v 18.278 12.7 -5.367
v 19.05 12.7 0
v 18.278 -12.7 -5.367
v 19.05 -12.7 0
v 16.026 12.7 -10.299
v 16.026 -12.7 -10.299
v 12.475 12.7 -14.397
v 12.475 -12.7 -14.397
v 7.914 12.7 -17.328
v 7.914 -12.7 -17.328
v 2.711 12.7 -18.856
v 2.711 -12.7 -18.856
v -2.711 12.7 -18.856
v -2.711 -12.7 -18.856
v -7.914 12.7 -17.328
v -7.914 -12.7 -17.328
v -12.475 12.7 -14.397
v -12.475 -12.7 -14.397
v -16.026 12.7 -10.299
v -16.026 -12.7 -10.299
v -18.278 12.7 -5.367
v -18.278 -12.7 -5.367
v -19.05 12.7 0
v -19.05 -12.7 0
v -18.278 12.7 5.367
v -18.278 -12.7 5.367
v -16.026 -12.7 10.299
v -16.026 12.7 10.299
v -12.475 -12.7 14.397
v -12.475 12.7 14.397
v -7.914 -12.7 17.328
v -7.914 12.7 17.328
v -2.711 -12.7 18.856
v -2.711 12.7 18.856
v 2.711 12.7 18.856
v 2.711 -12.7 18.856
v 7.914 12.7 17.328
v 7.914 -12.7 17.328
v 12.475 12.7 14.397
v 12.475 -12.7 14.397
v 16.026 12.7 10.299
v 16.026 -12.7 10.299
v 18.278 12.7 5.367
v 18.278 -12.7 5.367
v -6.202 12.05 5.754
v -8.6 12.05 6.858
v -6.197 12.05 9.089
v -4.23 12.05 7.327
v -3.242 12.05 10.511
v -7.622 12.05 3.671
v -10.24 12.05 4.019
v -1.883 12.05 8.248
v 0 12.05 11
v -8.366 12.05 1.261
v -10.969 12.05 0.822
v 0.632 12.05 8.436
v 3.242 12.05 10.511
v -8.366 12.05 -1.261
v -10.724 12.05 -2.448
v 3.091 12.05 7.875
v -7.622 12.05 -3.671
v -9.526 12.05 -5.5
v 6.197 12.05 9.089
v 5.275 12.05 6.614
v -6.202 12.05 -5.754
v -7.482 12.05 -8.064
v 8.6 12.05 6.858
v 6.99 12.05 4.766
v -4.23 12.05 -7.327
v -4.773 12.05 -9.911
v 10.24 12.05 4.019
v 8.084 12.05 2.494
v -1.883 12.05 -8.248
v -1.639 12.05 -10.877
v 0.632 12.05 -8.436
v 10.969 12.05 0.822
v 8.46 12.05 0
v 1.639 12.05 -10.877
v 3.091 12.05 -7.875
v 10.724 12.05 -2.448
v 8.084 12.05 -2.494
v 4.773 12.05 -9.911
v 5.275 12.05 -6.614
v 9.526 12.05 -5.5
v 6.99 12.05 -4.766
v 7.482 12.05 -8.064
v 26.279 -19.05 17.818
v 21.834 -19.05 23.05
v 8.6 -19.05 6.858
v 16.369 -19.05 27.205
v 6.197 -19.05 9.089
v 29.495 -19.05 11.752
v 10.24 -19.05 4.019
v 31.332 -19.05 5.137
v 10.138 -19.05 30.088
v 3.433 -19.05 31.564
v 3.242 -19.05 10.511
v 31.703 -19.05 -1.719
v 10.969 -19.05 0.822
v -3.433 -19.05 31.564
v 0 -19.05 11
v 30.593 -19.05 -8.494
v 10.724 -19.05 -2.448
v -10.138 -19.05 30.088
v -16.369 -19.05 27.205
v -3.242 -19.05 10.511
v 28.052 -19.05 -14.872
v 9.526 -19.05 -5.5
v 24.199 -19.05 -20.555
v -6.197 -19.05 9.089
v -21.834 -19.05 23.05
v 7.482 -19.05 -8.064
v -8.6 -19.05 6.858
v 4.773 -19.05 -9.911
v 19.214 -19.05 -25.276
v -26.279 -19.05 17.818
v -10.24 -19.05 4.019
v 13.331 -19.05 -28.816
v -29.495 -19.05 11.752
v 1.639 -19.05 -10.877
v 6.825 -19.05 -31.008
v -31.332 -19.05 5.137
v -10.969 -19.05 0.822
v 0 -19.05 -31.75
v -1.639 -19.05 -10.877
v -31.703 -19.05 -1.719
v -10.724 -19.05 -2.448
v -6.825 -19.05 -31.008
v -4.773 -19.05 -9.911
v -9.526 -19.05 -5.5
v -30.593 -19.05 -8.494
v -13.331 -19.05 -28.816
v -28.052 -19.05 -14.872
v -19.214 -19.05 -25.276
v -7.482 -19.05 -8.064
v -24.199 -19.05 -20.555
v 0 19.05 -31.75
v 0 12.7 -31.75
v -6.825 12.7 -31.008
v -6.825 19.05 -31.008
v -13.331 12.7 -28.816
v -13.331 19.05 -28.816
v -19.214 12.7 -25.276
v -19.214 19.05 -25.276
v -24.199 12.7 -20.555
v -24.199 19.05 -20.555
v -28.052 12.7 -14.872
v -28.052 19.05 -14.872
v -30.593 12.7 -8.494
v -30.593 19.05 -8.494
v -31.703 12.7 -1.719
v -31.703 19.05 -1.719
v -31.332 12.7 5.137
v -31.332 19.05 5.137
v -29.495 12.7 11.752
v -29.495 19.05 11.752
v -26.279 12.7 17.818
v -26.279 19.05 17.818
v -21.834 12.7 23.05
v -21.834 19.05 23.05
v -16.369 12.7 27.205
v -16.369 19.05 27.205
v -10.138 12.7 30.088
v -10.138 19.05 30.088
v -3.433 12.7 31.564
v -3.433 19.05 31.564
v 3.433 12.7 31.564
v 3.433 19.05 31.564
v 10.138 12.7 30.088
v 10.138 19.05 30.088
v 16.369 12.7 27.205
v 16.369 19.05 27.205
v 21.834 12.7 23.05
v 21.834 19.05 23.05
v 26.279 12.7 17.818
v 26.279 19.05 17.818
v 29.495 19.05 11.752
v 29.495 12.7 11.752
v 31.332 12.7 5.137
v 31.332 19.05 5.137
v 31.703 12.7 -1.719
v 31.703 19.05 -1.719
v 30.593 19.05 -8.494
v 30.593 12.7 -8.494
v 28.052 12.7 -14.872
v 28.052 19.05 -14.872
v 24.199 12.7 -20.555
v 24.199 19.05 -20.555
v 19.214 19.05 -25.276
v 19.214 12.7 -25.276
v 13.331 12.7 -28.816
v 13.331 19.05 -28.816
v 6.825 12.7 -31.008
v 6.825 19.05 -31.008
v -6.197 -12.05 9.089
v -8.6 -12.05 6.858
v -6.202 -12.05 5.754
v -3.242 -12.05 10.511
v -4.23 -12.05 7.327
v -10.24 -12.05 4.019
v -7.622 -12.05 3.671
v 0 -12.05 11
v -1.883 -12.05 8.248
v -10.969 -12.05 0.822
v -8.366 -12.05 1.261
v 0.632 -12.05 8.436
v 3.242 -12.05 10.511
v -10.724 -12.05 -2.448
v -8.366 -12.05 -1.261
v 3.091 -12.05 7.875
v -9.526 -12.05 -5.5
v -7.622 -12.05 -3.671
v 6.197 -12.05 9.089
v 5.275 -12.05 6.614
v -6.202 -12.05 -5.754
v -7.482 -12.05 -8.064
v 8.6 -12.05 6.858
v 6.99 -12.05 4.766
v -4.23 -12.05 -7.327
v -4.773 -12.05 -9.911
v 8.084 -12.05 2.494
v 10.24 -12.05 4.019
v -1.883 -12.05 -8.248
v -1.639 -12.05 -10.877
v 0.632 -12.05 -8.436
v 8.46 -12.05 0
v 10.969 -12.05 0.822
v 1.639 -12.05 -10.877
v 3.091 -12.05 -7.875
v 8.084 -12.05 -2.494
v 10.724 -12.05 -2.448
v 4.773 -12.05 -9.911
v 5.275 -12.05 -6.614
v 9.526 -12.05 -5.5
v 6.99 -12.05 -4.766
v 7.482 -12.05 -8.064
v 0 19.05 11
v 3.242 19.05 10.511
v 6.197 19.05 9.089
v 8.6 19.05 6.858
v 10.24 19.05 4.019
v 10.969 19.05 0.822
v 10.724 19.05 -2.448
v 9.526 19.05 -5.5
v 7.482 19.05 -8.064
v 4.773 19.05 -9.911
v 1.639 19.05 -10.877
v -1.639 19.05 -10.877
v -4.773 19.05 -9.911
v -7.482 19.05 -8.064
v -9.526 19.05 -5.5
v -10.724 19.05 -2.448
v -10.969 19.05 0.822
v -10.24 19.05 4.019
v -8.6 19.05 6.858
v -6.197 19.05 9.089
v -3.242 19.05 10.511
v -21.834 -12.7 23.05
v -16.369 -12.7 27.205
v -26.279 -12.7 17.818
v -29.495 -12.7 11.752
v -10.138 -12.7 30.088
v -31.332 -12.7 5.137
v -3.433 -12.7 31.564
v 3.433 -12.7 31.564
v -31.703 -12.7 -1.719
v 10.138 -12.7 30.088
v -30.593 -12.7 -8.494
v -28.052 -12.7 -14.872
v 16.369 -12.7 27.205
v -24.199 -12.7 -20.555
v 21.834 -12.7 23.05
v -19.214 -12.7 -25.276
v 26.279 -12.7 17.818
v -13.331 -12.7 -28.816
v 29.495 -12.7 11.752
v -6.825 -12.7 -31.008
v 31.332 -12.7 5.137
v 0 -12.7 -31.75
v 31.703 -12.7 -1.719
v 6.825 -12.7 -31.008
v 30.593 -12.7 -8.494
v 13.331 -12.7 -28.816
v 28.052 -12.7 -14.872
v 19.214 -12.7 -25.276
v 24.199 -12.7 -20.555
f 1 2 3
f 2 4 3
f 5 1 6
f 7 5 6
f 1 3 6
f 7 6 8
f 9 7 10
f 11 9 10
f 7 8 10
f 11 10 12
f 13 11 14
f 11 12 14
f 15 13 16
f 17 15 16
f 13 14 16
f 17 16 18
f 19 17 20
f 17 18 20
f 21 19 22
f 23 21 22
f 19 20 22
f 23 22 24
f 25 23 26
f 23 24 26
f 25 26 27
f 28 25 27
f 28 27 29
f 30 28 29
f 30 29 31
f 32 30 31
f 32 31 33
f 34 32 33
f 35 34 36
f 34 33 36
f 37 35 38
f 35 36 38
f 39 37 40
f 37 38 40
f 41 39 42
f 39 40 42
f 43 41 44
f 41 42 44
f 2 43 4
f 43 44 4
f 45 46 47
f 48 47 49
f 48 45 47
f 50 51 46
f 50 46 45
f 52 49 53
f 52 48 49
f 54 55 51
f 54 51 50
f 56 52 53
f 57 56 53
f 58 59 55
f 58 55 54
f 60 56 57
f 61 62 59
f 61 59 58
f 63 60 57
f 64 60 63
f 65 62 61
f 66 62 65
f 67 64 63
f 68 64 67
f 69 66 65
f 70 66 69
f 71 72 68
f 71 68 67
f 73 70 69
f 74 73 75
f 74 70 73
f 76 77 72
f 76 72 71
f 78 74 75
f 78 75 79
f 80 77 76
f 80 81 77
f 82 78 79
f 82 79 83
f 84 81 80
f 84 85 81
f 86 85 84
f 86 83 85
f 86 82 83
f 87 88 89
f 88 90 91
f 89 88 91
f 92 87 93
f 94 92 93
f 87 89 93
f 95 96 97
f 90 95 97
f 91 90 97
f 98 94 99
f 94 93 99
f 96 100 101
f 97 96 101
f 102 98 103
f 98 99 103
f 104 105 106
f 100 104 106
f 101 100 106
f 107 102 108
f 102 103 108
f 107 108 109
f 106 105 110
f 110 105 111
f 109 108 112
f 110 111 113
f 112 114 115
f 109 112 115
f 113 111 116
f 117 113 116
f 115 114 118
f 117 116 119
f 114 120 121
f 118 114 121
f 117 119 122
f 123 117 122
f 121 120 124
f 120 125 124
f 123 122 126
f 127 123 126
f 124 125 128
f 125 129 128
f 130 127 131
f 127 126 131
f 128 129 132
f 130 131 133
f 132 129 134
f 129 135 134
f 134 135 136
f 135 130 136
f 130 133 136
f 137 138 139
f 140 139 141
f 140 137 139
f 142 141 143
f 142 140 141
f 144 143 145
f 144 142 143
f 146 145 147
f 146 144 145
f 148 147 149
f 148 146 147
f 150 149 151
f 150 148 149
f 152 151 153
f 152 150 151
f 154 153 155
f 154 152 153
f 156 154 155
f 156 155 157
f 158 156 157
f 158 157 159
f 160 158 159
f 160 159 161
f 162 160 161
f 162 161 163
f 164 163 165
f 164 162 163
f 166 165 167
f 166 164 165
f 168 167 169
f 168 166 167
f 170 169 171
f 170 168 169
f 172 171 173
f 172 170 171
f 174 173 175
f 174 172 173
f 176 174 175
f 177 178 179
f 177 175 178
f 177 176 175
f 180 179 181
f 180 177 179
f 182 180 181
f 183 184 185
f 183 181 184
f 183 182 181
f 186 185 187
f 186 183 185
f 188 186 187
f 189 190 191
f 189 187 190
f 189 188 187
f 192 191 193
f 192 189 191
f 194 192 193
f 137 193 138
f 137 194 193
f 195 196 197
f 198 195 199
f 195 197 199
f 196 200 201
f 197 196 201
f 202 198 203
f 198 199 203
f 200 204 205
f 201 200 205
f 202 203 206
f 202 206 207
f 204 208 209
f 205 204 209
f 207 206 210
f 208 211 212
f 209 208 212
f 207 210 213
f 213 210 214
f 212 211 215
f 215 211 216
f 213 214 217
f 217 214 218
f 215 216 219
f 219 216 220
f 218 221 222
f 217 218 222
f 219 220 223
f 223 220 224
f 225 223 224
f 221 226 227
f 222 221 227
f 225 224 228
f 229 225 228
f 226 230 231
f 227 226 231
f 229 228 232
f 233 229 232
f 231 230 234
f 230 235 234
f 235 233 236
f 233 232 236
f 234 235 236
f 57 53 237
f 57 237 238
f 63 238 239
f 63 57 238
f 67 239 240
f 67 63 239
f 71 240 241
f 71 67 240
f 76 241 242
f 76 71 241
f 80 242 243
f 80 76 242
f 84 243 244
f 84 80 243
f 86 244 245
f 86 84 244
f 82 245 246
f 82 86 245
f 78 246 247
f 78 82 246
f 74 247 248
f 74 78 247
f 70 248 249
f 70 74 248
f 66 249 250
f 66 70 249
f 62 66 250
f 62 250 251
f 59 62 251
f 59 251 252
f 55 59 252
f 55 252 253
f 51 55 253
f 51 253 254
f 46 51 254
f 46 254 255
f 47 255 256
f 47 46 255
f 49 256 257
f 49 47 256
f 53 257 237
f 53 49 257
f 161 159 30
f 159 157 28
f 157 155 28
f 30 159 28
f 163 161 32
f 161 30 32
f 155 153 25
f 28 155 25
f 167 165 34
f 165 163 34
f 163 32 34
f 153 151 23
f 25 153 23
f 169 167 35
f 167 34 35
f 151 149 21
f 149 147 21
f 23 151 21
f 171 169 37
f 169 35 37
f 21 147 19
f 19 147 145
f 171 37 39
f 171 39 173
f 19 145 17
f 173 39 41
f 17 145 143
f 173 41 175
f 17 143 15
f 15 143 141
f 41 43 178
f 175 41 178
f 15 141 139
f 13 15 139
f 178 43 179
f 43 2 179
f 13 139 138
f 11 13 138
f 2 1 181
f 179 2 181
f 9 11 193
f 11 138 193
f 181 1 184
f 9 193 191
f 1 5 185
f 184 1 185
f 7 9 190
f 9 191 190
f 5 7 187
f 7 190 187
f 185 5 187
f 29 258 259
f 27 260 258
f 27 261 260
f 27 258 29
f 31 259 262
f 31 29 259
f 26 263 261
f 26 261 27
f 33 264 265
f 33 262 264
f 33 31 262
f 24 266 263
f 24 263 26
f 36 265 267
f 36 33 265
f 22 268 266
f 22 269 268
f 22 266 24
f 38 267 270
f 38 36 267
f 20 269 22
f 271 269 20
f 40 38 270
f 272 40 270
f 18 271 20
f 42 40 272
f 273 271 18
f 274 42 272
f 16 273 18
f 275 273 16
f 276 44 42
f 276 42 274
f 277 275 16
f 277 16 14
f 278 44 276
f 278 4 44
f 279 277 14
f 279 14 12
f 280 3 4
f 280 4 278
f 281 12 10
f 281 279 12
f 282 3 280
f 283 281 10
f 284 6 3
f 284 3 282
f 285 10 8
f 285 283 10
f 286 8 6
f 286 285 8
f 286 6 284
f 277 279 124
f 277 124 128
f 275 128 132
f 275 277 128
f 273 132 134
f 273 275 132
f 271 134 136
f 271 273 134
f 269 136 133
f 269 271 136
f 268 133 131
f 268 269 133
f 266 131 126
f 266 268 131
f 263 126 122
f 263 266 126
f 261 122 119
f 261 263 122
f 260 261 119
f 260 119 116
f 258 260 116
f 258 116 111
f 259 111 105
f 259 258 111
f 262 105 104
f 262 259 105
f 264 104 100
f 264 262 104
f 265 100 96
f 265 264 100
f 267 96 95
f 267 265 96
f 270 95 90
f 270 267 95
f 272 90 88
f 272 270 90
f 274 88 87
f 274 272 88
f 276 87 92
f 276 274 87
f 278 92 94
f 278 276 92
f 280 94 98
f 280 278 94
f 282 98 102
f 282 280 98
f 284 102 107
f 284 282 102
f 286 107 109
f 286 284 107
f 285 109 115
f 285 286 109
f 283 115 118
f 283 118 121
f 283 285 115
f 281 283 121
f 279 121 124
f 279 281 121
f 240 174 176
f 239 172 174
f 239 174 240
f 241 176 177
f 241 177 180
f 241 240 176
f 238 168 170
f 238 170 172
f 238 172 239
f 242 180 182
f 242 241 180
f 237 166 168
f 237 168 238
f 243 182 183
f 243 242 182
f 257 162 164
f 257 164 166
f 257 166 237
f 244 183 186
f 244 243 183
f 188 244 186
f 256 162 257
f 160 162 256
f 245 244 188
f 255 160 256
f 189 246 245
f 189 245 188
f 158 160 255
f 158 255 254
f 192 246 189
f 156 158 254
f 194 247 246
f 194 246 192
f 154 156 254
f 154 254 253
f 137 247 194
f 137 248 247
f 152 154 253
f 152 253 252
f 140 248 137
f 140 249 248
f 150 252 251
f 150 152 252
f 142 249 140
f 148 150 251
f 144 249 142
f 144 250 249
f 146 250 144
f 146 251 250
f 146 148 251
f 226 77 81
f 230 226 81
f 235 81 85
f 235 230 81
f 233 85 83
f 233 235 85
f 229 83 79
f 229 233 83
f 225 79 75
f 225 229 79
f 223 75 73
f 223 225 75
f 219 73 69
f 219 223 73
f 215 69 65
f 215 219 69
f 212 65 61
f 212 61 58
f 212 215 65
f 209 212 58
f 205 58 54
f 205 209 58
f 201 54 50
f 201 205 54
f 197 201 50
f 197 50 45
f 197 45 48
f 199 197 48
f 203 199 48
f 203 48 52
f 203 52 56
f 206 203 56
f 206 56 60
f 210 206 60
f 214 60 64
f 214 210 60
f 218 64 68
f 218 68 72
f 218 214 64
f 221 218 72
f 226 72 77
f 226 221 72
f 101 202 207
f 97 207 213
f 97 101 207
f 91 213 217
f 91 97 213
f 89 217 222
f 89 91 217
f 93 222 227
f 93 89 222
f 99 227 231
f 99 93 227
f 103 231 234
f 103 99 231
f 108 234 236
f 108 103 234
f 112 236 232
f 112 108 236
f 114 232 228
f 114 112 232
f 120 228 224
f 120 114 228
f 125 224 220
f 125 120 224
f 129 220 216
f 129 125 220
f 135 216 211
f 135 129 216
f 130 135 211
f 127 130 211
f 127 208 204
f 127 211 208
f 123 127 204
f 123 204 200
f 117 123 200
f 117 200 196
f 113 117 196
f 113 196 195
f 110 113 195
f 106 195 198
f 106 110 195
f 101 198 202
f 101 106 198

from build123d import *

# Parameters (mm, degrees)
SKETCH1_R               = 31.75
BOSS_EXTRUDE1_DEPTH     = 19.05
SKETCH2_R               = 31.75
SKETCH2_R_2             = 19.05
CUT_EXTRUDE_THIN1_DEPTH = 12.7
CUT_EXTRUDE1_DEPTH      = 49.775275499
CUT_EXTRUDE1_DEPTH_BACK = 49.775275499
SKETCH3_R               = 11
SKETCH6_R               = 11
SKETCH6_R_2             = 8.46
EXTRUDE_THIN1_DEPTH     = 12.05


with BuildPart() as part:
    # Sketch1 → Boss-Extrude1 (new, symmetric)
    with BuildSketch(Plane(origin=(0, 0, 0), x_dir=(1, 0, 0), z_dir=(0, 1, 0))):
        Circle(SKETCH1_R)
    extrude(amount=BOSS_EXTRUDE1_DEPTH, both=True)

    # Sketch2 → Cut-Extrude-Thin1 (cut, symmetric)
    with BuildSketch(Plane(origin=(0, 0, 0), x_dir=(1, 0, 0), z_dir=(0, 1, 0))):
        Circle(SKETCH2_R)
        Circle(SKETCH2_R_2, mode=Mode.SUBTRACT)
    extrude(amount=CUT_EXTRUDE_THIN1_DEPTH, both=True, mode=Mode.SUBTRACT)

    # Sketch3 → Cut-Extrude1 (cut, two sides: drawn at the far end of the back side and taken through both)
    with BuildSketch(Plane(origin=(0, 0, 0), x_dir=(1, 0, 0), z_dir=(0, 1, 0)).offset(-CUT_EXTRUDE1_DEPTH_BACK)):
        Circle(SKETCH3_R)
    extrude(amount=CUT_EXTRUDE1_DEPTH + CUT_EXTRUDE1_DEPTH_BACK, mode=Mode.SUBTRACT)

    # Sketch6 → Extrude-Thin1 (add, symmetric)
    with BuildSketch(Plane(origin=(0, 0, 0), x_dir=(1, 0, 0), z_dir=(0, 1, 0))):
        Circle(SKETCH6_R)
        Circle(SKETCH6_R_2, mode=Mode.SUBTRACT)
    extrude(amount=EXTRUDE_THIN1_DEPTH, both=True)


solid = part.part
